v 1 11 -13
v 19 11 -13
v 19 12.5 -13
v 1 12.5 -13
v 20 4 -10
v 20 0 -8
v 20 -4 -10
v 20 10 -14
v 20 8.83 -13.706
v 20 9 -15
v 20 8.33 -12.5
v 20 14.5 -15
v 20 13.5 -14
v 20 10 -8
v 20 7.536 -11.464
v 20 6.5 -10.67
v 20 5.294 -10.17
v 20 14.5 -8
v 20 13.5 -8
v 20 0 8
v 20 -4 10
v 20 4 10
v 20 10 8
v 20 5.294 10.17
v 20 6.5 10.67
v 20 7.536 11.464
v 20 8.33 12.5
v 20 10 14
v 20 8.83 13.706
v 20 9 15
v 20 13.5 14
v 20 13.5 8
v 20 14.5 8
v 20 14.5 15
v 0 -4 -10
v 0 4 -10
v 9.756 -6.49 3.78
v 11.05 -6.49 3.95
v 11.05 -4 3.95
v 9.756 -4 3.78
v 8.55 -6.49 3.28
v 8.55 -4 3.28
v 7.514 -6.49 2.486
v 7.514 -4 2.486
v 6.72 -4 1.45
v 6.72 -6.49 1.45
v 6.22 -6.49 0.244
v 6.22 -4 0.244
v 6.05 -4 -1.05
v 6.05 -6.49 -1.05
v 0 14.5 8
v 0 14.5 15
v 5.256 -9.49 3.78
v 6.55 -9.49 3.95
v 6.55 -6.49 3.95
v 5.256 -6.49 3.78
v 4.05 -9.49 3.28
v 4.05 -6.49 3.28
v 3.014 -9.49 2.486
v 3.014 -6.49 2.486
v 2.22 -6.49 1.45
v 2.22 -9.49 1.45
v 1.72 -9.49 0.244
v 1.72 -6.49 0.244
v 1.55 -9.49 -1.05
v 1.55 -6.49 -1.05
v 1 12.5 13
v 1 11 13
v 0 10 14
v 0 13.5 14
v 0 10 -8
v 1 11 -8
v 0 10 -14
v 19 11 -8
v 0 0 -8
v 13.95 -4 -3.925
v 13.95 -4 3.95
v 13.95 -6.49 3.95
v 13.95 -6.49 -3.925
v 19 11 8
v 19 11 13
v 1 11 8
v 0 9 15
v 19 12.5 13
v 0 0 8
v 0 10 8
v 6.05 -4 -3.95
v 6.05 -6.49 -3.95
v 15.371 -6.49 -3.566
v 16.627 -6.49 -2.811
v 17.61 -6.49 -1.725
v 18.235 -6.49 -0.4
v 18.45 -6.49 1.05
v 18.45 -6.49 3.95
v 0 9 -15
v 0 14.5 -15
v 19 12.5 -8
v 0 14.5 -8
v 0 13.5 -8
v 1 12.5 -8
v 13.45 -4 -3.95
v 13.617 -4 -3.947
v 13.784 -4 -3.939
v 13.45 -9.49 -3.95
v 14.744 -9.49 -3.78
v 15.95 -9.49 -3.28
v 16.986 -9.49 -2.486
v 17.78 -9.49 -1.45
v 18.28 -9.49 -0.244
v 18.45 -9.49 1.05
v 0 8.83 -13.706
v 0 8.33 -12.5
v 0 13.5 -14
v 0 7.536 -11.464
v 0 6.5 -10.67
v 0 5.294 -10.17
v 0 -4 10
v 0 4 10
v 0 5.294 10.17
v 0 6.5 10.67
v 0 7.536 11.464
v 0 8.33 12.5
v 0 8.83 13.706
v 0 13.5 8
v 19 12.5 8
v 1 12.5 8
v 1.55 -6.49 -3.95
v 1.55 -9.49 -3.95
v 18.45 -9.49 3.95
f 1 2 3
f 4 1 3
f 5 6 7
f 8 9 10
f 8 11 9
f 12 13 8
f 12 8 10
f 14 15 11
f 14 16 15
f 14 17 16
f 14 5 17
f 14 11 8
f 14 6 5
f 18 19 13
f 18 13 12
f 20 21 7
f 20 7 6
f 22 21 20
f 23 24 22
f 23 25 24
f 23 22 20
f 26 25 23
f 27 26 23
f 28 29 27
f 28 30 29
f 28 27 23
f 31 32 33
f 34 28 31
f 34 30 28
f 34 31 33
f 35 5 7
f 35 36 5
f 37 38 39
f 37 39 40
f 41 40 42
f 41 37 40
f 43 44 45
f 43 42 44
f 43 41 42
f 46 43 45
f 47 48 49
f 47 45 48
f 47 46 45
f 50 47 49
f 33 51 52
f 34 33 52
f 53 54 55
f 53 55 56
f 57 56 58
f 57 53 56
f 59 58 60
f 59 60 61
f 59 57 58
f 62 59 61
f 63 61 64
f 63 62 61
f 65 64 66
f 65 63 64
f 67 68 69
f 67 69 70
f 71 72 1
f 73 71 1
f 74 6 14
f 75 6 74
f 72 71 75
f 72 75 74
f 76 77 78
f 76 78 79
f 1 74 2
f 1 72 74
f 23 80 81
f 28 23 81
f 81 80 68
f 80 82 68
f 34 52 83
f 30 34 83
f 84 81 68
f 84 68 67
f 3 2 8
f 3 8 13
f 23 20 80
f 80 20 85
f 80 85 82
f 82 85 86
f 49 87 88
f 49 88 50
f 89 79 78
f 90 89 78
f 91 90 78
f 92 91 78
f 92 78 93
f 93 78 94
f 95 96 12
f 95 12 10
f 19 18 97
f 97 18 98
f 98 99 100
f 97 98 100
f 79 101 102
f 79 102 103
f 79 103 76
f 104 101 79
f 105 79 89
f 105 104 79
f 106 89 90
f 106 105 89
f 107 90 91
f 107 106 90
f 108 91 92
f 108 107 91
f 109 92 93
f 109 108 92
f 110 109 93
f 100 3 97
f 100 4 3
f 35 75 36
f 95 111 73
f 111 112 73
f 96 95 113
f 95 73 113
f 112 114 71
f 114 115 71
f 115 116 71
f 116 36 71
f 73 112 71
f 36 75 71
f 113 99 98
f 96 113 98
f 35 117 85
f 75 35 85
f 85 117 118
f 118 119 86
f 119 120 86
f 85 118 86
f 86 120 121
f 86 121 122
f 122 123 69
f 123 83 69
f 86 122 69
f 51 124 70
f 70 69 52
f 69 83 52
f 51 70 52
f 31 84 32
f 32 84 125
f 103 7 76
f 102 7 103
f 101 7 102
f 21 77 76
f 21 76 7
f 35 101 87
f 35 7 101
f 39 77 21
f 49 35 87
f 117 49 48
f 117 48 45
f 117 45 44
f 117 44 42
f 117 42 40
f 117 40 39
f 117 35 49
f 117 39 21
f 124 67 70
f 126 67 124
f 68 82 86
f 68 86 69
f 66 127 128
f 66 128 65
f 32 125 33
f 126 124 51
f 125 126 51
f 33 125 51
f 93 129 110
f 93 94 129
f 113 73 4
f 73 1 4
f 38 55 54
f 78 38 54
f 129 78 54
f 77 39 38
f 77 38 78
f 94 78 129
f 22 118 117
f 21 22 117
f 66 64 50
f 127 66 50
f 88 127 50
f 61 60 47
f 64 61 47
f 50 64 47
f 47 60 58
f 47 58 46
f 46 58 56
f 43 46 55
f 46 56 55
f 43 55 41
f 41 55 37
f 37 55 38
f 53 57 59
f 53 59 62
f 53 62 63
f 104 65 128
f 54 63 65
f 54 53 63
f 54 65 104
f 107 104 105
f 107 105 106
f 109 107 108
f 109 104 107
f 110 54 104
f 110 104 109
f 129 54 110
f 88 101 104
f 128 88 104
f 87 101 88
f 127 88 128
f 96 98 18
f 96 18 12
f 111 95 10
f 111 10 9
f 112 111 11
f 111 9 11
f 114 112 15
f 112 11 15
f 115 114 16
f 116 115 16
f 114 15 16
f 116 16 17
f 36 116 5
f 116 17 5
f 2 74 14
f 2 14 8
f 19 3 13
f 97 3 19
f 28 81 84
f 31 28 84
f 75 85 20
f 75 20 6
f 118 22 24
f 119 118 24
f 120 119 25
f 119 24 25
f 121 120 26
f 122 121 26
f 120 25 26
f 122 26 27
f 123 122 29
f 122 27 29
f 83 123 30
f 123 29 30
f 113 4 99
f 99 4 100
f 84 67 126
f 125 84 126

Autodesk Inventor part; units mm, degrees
ref_plane "YZ Plane" through (0, 0, 0) normal (1, 0, 0) x (0, 1, 0)
ref_plane "XZ Plane" through (0, 0, 0) normal (0, 1, 0) x (-1, 0, 0)
ref_plane "XY Plane" through (0, 0, 0) normal (0, 0, 1) x (1, 0, 0)
sketch "Sketch1" plane through (0, 0, 0) normal (1, 0, 0) x (0, 1, 0)
  line L0 (0, 8) -> (0, -8)
  line L1 (0, -8) -> (11, -8)
  line L2 (0, 8) -> (11, 8)
  line L3 (11, 8) -> (11, 13)
  line L4 (11, 13) -> (12.5, 13)
  line L5 (12.5, 13) -> (12.5, 8)
  line L6 (12.5, 8) -> (14.5, 8)
  line L7 (14.5, 8) -> (14.5, 15)
  line L8 (14.5, 15) -> (9, 15)
  line L9 (9, 15) -> (9, 10)
  line L10 (9, 10) -> (-3, 10)
  line L11 (-3, 10) -> (-4, 10)
  line L12 (-4, 10) -> (-4, 2.5)
  line L13 (0, 0) -> (3.5, 0)
  line L14 (0, -8) -> (11, -8)
  line L15 (11, -8) -> (11, -13)
  line L16 (11, -13) -> (12.5, -13)
  line L17 (12.5, -13) -> (12.5, -8)
  line L18 (14.5, -8) -> (14.5, -15)
  line L19 (14.5, -15) -> (9, -15)
  line L20 (9, -15) -> (9, -10)
  line L21 (9, -10) -> (-3, -10)
  line L22 (-3, -10) -> (-4, -10)
  line L23 (-4, -10) -> (-4, 2.5)
  line L24 (14.5, -8) -> (12.5, -8)
  point P0 (11.75, -15)
  point P1 (11.75, -13)
  dimension "d0" = 16
  dimension "d1" = 0
  dimension "d2" = 11
  dimension "d3" = 11
  dimension "d4" = 5
  dimension "d5" = 1.5
  dimension "d6" = 2
  dimension "d7" = 7
  dimension "d8" = 5.5
  dimension "d9" = 5
  dimension "d10" = 1
  dimension "d13" = 2
  dimension "d14" = 4
extrude "Extrusion1" add sketch "Sketch1" along normal blind 20
fillet "Fillet1" radius 5 2 edges at (10, 9, -10) (10, 9, 10)
chamfer "Chamfer1" distance 1 angle 45 12 edges at (20, 11, -10.5) (20, 11.75, -13) (20, 12.5, -10.5) (20, 11, 10.5) (20, 11.75, 13) (20, 12.5, 10.5) (0, 11, -10.5) (0, 11.75, -13) (0, 12.5, -10.5) (0, 11, 10.5) (0, 11.75, 13) (0, 12.5, 10.5)
sketch "Sketch3" plane through (0, -4, -10) normal (0, -1, 0) x (1, 0, 0)
  line L0 (13.95, 6.05) -> (6.05, 6.05)
  line L1 (6.05, 6.05) -> (6.05, 13.95)
  line L2 (6.05, 13.95) -> (13.95, 13.95)
  line L3 (13.95, 13.95) -> (13.95, 6.05)
  line L4 (20, 20) -> (20, 0) projected
  line L5 (0, -5) -> (20, -5) projected
  point P0 (0, 10)
  point P1 (20, 10)
  dimension "d28" = 7.9
  dimension "d29" = 7.9
  dimension "d30" = 6.05
  dimension "d31" = 11.05
extrude "Extrusion3" add sketch "Sketch3" along normal blind 2.49
sketch "Sketch4" plane through (0, -6.49, -10) normal (0, -1, 0) x (1, 0, 0)
  line L0 (18.45, 6.05) -> (1.55, 6.05)
  line L1 (1.55, 6.05) -> (1.55, 13.95)
  line L2 (1.55, 13.95) -> (18.45, 13.95)
  line L3 (18.45, 13.95) -> (18.45, 6.05)
  line L4 (6.05, 6.05) -> (13.95, 6.05) projected
  line L5 (13.95, 13.95) -> (6.05, 13.95) projected
  line L6 (20, 20) -> (20, 0) projected
  point P0 (0, 10)
  point P1 (18.45, 10)
  dimension "d34" = 0
  dimension "d35" = 0
  dimension "d36" = 16.9
  dimension "d37" = 1.55
extrude "Extrusion4" add sketch "Sketch4" along normal blind 3
fillet "Fillet2" radius 5 4 edges at (18.45, -7.99, -3.95) (13.95, -5.245, -3.95) (6.05, -5.245, 3.95) (1.55, -7.99, 3.95)
sketch "Sketch2" plane through (0, 0, 8) normal (0, 1, 0) x (1, 0, 0)
  circle A0 centre (10, 7.5) radius 3
  line L0 (20, 16) -> (20, 0) projected
  line L1 (0, -7) -> (20, -7) projected
  line L2 (0, 0) -> (20, 0) projected
  point P0 (0, 8)
  dimension "d19" = 6
  dimension "d20" = 10
  dimension "d27" = 7.5
properties part number "Drziak_4"
